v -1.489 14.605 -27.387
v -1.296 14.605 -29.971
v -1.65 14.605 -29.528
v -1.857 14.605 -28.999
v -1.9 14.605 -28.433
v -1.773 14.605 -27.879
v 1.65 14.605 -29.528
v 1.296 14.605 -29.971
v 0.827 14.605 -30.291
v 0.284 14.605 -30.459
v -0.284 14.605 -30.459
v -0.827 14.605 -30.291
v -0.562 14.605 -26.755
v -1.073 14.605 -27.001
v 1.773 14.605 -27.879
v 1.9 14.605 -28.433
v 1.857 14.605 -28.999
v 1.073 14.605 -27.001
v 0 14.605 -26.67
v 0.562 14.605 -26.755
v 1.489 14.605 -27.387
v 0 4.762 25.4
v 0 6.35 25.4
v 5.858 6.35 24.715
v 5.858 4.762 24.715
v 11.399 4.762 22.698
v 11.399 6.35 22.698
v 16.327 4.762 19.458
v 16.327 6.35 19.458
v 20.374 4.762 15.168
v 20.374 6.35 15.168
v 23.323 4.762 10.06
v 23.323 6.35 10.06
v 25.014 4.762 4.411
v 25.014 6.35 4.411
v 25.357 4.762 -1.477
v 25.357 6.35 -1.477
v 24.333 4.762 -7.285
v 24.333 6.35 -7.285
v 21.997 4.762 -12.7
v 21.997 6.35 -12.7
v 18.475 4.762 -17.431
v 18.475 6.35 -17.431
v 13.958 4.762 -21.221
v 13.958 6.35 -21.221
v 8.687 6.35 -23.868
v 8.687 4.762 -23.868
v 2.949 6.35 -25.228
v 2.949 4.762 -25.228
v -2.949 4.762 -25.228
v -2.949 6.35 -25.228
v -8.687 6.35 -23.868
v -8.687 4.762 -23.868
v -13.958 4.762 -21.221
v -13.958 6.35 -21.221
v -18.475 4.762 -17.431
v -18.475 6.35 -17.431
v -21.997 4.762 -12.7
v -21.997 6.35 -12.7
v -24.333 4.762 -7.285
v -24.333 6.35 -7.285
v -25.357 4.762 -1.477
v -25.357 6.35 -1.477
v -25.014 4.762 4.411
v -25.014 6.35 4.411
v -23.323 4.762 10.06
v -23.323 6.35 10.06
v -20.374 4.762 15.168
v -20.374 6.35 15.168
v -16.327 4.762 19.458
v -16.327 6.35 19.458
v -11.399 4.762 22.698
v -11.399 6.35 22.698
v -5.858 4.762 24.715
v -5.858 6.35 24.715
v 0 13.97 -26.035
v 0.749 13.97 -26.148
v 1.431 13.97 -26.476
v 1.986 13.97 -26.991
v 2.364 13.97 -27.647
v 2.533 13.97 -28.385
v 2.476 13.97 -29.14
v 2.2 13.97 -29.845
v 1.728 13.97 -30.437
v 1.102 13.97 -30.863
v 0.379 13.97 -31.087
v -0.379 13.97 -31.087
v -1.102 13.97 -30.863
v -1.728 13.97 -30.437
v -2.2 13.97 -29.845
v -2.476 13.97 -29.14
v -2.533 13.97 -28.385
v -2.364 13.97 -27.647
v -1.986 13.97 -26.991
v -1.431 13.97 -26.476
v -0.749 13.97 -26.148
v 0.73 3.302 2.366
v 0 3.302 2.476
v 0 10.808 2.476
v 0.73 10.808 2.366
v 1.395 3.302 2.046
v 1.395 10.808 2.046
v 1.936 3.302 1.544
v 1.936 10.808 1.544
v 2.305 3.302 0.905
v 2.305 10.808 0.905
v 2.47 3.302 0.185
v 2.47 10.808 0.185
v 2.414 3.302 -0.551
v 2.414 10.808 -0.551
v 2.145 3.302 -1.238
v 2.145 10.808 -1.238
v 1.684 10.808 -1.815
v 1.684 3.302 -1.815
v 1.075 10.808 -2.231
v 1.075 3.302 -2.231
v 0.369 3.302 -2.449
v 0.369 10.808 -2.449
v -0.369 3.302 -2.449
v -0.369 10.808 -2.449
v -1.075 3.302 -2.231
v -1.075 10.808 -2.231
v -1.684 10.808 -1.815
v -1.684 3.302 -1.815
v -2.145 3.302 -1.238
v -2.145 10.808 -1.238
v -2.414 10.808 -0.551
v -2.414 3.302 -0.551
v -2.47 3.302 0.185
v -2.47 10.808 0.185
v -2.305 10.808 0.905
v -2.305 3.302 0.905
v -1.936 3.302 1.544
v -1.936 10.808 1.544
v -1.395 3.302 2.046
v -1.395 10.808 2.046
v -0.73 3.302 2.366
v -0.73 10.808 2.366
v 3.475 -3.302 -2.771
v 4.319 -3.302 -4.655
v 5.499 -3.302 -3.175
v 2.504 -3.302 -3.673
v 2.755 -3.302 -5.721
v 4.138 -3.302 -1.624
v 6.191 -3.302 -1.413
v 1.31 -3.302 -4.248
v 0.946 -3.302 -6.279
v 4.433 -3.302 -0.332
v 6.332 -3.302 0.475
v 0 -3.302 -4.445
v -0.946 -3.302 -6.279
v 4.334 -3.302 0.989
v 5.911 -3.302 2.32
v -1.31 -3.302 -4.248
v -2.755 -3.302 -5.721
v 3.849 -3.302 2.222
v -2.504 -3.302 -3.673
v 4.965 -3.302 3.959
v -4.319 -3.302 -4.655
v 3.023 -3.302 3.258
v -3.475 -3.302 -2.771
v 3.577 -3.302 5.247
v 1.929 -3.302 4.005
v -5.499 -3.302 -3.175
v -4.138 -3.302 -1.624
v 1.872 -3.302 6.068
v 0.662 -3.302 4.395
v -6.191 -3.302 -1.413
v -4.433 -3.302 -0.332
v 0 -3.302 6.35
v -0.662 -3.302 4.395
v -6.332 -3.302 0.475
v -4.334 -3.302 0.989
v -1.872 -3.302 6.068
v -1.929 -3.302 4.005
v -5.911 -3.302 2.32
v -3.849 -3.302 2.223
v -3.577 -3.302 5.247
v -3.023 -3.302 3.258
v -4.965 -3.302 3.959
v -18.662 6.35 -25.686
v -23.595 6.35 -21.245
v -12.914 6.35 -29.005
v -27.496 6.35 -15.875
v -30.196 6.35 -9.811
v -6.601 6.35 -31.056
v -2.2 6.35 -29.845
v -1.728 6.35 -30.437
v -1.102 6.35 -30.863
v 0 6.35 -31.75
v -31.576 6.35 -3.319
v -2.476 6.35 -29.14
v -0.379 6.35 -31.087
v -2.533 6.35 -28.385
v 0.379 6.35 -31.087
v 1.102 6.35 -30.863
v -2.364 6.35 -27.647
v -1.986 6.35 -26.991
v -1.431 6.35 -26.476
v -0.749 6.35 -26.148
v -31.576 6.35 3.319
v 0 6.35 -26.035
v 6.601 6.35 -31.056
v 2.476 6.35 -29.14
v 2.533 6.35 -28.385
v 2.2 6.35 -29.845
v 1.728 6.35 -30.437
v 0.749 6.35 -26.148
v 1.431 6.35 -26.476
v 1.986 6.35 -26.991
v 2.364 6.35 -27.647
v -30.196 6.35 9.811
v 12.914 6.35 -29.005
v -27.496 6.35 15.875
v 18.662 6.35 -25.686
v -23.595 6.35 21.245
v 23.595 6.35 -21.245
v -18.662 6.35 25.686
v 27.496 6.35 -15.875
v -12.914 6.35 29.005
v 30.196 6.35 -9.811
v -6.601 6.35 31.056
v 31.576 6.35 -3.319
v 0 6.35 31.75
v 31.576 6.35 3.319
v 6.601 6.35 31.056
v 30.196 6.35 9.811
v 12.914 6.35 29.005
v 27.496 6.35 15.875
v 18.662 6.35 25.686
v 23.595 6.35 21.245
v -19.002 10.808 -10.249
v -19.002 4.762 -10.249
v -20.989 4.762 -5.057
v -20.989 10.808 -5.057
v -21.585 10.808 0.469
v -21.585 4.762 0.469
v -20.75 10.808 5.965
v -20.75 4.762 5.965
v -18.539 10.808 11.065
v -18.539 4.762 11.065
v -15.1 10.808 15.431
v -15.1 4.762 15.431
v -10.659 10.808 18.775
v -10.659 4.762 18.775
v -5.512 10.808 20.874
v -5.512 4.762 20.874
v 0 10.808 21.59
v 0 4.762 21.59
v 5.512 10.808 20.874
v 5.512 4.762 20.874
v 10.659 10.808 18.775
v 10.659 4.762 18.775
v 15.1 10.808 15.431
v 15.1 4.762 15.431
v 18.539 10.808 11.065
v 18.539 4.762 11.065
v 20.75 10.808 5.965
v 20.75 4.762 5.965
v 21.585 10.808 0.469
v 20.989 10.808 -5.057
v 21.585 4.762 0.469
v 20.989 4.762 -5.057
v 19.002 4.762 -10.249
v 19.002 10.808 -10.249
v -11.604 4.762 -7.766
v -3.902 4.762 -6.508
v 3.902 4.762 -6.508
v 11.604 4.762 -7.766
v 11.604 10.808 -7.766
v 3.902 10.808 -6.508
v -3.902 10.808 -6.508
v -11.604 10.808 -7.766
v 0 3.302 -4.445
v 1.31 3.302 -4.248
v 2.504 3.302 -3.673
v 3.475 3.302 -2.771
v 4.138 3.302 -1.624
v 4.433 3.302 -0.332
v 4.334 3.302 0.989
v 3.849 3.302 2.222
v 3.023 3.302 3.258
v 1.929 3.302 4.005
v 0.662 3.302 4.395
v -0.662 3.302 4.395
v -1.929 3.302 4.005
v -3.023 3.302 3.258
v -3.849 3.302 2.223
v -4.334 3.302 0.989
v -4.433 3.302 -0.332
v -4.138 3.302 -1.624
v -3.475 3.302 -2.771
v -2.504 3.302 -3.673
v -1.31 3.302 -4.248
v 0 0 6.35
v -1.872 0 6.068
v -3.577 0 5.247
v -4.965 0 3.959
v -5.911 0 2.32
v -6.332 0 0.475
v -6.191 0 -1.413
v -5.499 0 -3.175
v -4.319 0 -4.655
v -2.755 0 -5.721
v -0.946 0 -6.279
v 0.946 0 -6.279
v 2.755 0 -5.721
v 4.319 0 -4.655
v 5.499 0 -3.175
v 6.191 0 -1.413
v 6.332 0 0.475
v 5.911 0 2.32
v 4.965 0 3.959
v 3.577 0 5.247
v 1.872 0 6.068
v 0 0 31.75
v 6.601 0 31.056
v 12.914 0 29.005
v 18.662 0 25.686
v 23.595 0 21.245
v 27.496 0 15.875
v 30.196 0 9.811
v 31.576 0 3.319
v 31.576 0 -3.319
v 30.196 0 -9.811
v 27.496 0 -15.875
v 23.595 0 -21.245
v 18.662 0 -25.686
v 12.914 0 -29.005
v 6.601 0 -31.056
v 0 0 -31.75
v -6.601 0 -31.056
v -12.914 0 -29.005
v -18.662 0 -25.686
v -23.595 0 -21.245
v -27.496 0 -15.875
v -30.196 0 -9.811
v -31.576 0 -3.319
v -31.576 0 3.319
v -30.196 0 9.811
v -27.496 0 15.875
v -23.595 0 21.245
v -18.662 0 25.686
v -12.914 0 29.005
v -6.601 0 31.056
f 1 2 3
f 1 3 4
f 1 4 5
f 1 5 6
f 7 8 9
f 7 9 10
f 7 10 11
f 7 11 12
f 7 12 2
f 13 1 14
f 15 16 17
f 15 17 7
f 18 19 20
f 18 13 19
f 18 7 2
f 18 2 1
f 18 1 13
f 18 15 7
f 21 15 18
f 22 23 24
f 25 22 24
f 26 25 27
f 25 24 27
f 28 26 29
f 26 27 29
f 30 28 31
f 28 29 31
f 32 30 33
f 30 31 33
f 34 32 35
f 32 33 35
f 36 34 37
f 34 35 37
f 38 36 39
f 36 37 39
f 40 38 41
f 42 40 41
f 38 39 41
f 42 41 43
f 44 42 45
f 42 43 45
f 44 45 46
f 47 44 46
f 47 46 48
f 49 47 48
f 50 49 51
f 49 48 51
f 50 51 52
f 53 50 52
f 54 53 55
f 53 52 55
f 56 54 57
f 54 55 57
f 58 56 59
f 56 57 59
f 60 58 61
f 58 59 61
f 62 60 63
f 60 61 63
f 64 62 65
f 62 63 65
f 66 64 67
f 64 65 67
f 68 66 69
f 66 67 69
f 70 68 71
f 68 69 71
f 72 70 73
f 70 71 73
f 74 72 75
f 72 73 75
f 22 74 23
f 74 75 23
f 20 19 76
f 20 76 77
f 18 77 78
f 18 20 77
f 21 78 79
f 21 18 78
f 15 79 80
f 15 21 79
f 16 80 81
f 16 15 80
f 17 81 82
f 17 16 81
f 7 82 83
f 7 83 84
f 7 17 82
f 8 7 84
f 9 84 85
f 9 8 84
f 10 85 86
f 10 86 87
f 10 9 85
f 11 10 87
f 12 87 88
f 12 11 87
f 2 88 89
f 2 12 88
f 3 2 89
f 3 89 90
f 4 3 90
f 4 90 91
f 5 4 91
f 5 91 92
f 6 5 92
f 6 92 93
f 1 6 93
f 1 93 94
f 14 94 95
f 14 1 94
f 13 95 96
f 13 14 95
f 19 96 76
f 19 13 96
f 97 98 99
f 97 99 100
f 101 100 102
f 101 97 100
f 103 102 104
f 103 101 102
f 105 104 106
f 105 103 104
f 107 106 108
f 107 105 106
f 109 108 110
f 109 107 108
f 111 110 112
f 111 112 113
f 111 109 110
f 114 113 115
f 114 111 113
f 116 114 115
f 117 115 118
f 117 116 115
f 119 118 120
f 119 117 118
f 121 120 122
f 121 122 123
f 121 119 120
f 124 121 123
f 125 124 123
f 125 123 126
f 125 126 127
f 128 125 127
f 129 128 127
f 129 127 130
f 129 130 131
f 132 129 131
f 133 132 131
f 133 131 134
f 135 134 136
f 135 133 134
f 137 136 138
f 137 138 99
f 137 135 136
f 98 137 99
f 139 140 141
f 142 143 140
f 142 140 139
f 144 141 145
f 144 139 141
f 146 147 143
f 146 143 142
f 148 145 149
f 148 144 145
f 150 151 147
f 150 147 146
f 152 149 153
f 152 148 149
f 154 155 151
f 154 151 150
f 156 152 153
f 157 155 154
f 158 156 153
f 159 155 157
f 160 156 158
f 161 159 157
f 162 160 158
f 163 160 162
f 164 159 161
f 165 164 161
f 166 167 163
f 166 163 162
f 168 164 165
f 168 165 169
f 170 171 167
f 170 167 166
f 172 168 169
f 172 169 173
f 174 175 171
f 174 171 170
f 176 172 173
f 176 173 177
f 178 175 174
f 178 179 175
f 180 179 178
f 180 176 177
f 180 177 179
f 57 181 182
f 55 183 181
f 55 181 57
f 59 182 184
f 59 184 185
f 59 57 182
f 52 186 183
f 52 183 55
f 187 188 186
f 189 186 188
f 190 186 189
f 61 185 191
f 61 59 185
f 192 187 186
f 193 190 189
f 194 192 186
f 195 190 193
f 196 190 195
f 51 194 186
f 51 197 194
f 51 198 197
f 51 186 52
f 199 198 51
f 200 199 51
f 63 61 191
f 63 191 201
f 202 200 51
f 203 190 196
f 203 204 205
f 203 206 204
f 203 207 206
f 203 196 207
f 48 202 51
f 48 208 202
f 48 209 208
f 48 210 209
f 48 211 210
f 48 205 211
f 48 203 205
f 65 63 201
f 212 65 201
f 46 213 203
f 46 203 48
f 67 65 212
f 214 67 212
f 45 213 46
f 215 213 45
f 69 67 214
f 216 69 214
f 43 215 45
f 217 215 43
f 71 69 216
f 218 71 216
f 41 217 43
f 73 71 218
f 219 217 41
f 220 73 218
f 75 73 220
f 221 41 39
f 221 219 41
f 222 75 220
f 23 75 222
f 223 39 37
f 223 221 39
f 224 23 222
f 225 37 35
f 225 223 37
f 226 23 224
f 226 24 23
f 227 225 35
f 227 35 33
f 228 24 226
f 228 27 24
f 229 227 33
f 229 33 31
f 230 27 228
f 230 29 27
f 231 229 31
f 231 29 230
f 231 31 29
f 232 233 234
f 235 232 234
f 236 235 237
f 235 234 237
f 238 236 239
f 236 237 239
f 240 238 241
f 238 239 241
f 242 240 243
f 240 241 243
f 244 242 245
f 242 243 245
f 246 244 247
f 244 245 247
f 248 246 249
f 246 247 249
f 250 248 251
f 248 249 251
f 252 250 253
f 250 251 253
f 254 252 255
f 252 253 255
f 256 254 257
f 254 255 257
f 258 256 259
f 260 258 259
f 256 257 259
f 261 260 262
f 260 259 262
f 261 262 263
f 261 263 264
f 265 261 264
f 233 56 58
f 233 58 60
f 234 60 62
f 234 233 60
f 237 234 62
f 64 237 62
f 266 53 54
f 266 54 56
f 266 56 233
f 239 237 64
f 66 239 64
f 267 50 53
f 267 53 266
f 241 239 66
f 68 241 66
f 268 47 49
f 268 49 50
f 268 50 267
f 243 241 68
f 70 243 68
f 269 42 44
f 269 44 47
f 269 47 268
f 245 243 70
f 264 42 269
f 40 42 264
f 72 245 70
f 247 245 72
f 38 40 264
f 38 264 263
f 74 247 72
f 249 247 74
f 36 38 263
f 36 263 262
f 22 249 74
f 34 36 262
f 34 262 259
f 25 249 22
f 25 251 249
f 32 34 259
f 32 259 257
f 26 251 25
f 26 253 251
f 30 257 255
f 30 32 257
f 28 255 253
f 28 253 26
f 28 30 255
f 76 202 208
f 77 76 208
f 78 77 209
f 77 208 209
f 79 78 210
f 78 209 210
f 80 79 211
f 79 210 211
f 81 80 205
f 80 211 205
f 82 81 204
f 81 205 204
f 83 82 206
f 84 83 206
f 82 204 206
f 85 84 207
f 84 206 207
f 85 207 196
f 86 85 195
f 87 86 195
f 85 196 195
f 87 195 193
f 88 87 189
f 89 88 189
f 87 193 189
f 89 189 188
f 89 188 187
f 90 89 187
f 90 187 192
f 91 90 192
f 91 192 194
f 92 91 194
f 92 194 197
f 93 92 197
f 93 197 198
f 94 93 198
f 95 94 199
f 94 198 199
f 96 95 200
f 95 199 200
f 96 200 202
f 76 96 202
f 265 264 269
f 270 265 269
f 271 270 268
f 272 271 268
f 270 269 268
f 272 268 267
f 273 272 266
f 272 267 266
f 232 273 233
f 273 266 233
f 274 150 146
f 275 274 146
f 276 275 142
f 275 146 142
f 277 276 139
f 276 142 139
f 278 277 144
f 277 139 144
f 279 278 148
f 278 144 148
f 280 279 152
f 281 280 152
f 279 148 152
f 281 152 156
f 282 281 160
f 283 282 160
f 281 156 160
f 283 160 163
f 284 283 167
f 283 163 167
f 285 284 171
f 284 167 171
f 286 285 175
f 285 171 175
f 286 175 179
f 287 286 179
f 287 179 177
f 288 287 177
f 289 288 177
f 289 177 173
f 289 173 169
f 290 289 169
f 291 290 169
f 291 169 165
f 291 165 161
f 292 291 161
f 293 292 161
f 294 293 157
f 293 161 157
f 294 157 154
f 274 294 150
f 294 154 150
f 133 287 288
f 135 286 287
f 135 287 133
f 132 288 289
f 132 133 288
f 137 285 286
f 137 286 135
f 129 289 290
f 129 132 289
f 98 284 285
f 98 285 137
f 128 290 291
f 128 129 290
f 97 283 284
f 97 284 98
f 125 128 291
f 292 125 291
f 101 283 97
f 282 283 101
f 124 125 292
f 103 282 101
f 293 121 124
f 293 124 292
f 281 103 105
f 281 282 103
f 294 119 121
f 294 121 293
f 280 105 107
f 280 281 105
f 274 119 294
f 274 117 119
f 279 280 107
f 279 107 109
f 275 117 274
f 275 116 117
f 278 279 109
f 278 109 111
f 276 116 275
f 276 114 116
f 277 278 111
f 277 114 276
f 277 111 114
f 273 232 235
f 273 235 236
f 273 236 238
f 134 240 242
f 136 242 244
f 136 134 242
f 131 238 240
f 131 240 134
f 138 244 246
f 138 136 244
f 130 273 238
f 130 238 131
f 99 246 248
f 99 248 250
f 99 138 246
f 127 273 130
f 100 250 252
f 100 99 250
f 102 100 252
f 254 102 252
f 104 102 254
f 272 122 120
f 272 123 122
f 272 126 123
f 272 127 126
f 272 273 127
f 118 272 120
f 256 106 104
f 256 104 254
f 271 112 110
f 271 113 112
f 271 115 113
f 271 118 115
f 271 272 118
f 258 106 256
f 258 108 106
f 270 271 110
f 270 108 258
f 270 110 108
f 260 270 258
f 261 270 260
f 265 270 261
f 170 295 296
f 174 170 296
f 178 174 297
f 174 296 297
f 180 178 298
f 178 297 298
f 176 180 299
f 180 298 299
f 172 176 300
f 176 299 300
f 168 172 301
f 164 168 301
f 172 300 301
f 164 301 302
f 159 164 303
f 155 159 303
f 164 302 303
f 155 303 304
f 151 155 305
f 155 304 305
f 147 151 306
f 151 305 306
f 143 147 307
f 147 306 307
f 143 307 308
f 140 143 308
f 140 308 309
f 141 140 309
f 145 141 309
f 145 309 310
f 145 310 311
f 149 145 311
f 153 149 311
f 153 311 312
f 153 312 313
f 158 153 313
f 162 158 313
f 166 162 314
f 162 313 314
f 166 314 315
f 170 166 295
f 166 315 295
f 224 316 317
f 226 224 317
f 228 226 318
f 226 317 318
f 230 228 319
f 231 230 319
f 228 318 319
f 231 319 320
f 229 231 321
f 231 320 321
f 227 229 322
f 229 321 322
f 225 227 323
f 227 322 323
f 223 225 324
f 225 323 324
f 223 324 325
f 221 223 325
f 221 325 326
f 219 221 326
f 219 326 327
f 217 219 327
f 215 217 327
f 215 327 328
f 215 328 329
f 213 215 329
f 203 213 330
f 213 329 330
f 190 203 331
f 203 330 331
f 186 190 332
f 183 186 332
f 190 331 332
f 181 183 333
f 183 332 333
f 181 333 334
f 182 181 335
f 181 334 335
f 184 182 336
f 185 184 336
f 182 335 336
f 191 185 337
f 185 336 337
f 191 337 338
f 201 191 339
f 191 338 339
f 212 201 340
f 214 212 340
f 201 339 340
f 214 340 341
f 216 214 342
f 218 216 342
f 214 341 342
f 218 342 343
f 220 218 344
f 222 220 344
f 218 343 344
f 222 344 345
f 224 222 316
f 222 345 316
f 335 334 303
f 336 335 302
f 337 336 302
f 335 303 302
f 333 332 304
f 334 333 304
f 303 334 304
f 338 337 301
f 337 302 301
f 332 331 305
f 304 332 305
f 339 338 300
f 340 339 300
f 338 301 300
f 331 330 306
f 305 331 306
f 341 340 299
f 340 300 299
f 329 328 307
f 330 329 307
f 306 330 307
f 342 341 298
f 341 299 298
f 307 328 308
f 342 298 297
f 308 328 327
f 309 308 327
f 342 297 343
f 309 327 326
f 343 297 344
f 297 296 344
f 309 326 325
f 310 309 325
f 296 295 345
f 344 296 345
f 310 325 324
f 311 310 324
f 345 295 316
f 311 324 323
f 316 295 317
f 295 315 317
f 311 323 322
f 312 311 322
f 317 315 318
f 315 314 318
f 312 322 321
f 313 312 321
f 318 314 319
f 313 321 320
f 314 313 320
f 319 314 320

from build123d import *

# Parameters (mm, degrees)
SKETCH1_R           = 31.75
SKETCH1_R_2         = 2.4765
BOSS_EXTRUDE1_DEPTH = 6.35
SKETCH2_R           = 25.4
CUT_EXTRUDE1_DEPTH  = 1.5875
SKETCH3_R           = 2.4765
BOSS_EXTRUDE2_DEPTH = 6.0452
SKETCH4_R           = 2.54
BOSS_EXTRUDE3_DEPTH = 8.255
CHAMFER1_SIZE       = 0.635
SKETCH5_R           = 6.35
BOSS_EXTRUDE4_DEPTH = 3.302
SKETCH6_R           = 4.445
CUT_EXTRUDE2_DEPTH  = 6.604


with BuildPart() as part:
    # Sketch1 → Boss-Extrude1 (new body)
    with BuildSketch(Plane(origin=(0, 0, 0), x_dir=(1, 0, 0), z_dir=(0, 1, 0))):
        with Locations(Location((0, 0, 0), (0, 0, 270))):
            Circle(SKETCH1_R)
        with Locations(Location((0, 0, 0), (0, 0, 270))):
            Circle(SKETCH1_R_2, mode=Mode.SUBTRACT)
    extrude(amount=BOSS_EXTRUDE1_DEPTH)

    # Sketch2 → Cut-Extrude1 (cut)
    with BuildSketch(Plane(origin=(0, 6.35, 0), x_dir=(1, 0, 0), z_dir=(0, 1, 0))):
        with Locations(Location((0, 0, 0), (0, 0, 270))):
            Circle(SKETCH2_R)
    extrude(amount=-CUT_EXTRUDE1_DEPTH, mode=Mode.SUBTRACT)

    # Sketch3 → Boss-Extrude2 (add)
    with BuildSketch(Plane(origin=(0, 4.7625, 0), x_dir=(1, 0, 0), z_dir=(0, 1, 0))):
        with BuildLine():
            ThreePointArc((-19.002478857, 10.248604651), (0, -21.59), (19.002478857, 10.248604651))
            ThreePointArc((19.002478857, 10.248604651), (0, 6.35), (-19.002478857, 10.248604651))
        make_face()
        with Locations(Location((0, 0, 0), (0, 0, 270))):
            Circle(SKETCH3_R, mode=Mode.SUBTRACT)
    extrude(amount=BOSS_EXTRUDE2_DEPTH)

    # Sketch4 → Boss-Extrude3 (add)
    with BuildSketch(Plane(origin=(0, 6.35, 0), x_dir=(1, 0, 0), z_dir=(0, 1, 0))):
        with Locations(Location((0, 28.575, 0), (0, 0, 270))):
            Circle(SKETCH4_R)
    extrude(amount=BOSS_EXTRUDE3_DEPTH)

    # Chamfer1
    chamfer1_edges = [part.edges().sort_by_distance(p)[0] for p in [
        (0, 14.605, -31.115),
    ]]
    chamfer(chamfer1_edges, length=CHAMFER1_SIZE)

    # Sketch5 → Boss-Extrude4 (add)
    with BuildSketch(Plane.XZ):
        with Locations(Location((0, 0, 0), (0, 0, 90))):
            Circle(SKETCH5_R)
    extrude(amount=BOSS_EXTRUDE4_DEPTH)

    # Sketch6 → Cut-Extrude2 (cut)
    with BuildSketch(Plane.XZ.offset(3.302)):
        with Locations(Location((0, 0, 0), (0, 0, 270))):
            Circle(SKETCH6_R)
    extrude(amount=-CUT_EXTRUDE2_DEPTH, mode=Mode.SUBTRACT)


solid = part.part
